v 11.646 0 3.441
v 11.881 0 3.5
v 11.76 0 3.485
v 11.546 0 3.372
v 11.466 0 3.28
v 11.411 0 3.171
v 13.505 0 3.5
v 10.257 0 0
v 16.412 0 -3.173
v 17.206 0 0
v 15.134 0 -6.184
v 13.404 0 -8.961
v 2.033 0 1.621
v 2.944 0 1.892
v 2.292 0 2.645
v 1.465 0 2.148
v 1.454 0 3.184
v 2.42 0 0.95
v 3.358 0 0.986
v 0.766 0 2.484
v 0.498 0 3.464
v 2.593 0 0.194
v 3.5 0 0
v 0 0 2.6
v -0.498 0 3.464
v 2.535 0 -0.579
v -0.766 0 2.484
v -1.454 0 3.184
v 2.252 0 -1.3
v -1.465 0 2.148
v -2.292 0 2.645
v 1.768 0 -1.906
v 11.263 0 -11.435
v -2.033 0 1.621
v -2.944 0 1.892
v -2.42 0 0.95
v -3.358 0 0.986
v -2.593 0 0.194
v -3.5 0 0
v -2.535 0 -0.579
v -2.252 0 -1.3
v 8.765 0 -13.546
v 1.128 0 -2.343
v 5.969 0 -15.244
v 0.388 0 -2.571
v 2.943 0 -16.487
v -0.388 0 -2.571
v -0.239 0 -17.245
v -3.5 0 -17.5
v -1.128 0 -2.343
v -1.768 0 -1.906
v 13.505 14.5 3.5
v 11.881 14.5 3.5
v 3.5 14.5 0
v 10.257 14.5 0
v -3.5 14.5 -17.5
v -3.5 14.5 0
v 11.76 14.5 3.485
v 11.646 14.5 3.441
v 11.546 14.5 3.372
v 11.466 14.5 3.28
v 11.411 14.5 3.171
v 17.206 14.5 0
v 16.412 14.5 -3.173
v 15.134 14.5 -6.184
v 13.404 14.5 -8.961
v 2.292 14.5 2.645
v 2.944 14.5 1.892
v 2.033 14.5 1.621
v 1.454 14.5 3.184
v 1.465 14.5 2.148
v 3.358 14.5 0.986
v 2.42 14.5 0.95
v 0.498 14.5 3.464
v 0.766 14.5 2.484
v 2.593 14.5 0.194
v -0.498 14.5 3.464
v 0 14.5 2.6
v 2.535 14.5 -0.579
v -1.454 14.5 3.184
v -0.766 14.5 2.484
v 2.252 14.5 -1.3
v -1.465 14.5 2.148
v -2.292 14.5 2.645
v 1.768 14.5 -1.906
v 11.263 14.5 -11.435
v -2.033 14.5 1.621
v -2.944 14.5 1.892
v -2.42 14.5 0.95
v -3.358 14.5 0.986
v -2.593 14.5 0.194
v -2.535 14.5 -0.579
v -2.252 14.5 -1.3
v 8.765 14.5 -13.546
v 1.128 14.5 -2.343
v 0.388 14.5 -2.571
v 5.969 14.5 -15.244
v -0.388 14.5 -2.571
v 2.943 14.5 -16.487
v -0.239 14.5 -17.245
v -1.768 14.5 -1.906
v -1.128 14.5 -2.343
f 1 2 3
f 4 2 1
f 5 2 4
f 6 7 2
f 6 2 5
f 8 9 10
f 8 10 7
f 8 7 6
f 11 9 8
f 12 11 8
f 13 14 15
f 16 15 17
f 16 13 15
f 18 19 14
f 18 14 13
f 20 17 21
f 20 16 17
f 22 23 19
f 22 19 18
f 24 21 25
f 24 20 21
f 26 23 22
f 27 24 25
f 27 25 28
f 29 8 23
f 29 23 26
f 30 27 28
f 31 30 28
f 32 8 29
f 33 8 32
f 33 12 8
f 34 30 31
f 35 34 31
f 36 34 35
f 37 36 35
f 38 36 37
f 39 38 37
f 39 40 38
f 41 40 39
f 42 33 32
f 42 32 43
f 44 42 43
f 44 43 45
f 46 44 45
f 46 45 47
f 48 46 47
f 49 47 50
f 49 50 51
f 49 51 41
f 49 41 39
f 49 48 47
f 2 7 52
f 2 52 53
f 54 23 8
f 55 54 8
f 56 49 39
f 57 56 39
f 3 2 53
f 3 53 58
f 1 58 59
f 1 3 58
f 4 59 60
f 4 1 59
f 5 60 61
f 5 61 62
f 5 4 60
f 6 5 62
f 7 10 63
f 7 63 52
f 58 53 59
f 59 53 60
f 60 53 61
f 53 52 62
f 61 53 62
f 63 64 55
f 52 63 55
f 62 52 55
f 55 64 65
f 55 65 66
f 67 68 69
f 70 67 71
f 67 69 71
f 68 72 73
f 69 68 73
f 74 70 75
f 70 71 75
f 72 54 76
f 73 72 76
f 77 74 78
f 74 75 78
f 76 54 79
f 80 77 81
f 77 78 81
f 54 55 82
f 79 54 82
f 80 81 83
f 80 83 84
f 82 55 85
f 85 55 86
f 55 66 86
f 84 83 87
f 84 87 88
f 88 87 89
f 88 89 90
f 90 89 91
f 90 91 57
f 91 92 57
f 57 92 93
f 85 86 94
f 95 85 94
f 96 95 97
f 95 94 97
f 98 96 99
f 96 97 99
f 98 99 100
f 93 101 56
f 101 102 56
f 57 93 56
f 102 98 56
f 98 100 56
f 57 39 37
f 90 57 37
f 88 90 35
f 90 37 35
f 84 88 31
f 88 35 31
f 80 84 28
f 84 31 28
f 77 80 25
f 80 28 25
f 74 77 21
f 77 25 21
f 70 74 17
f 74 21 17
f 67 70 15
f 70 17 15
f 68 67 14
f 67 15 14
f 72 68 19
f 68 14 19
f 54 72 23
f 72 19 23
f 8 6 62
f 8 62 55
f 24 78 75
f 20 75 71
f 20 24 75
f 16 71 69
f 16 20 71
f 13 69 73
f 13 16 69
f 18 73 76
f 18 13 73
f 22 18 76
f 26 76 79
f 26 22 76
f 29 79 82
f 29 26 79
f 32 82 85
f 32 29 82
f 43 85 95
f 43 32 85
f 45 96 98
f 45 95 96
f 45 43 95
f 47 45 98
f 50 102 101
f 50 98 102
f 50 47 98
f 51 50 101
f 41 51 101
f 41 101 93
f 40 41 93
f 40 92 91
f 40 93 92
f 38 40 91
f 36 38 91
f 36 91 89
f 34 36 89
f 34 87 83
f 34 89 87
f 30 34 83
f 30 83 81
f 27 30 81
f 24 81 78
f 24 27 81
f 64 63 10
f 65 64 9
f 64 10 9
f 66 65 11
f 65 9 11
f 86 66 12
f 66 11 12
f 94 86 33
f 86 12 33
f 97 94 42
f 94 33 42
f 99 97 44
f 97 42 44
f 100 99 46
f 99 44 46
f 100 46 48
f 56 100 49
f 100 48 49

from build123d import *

# Parameters (mm, degrees)
SKETCH2_R           = 3.5
SKETCH2_R_2         = 2.6
BOSS_EXTRUDE1_DEPTH = 14.6
SKETCH4_W           = 39.254699086
SKETCH4_H           = 35.178673269
CUT_EXTRUDE1_DEPTH  = 0.1
BOSS_EXTRUDE5_DEPTH = 14.5


with BuildPart() as part:
    # Sketch2 → Boss-Extrude1 (new body)
    # profile 1 of 2: a face of its own
    with BuildSketch(Plane(origin=(0, 0, 0), x_dir=(1, 0, 0), z_dir=(0, 1, 0))):
        with BuildLine():
            Line((-3.5, 17.5), (-3.5, 0))
            ThreePointArc((-3.5, 0), (0, 3.5), (3.5, 0))
            Line((3.5, 0), (17.206279241, 0))
            ThreePointArc((17.206279241, 0), (10.055441712, 12.539014932), (-3.5, 17.5))
        make_face()
    # profile 2 of 2: a face of its own
    with BuildSketch(Plane(origin=(0, 0, 0), x_dir=(1, 0, 0), z_dir=(0, 1, 0))):
        Circle(SKETCH2_R)
        with Locations(Location((0, 0, 0), (0, 0, 270))):
            Circle(SKETCH2_R_2, mode=Mode.SUBTRACT)
    extrude(amount=BOSS_EXTRUDE1_DEPTH)

    # Sketch4 → Cut-Extrude1 (cut)
    with BuildSketch(Plane(origin=(0, 14.6, 0), x_dir=(1, 0, 0), z_dir=(0, 1, 0))):
        with Locations((10.965886391, 4.797703191)):
            Rectangle(SKETCH4_W, SKETCH4_H)
    extrude(amount=-CUT_EXTRUDE1_DEPTH, mode=Mode.SUBTRACT)

    # Sketch7 → Boss-Extrude5 (add)
    with BuildSketch(Plane(origin=(0, 0, 0), x_dir=(-1, 0, 0), z_dir=(0, -1, 0))):
        with BuildLine():
            ThreePointArc((-11.881011918, -3.5), (-11.5942237, -3.409576022), (-11.411165608, -3.171010072))
            Line((-11.411165608, -3.171010072), (-10.257012329, 0))
            Line((-10.257012329, 0), (-13.505011507, 0))
            Line((-13.505011507, 0), (-17.206279241, 0))
            Line((-17.206279241, 0), (-13.505011507, -3.5))
            Line((-13.505011507, -3.5), (-11.881011918, -3.5))
        make_face()
    extrude(amount=-BOSS_EXTRUDE5_DEPTH)


solid = part.part
